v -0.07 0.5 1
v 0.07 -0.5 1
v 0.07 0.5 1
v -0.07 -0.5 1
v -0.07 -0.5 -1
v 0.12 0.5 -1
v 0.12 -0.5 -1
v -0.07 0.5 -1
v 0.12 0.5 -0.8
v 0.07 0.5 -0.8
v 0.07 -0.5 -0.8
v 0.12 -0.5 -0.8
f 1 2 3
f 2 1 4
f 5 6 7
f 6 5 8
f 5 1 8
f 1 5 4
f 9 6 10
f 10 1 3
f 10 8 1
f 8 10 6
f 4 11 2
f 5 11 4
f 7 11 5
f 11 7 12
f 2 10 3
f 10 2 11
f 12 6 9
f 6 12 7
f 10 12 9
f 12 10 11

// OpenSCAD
module Wall_01(rot = 0){
    rotate([0,0,90 * rot]){
    
    translate([-0.06,0,0])
    color("white")
    cube([0.02,1,2], center= true);
    
    color("#295f48")
    translate([0.06,0,0])
    color("white")
    cube([0.02,1,2], center= true);
    
    
    color("#b2b2b2")
    cube([0.1,1,2], center= true);
    
    translate([0.095,0,-0.9])    
    color("gray")
    cube([0.05,1,0.2], center= true);

    }
}


Wall_01();
